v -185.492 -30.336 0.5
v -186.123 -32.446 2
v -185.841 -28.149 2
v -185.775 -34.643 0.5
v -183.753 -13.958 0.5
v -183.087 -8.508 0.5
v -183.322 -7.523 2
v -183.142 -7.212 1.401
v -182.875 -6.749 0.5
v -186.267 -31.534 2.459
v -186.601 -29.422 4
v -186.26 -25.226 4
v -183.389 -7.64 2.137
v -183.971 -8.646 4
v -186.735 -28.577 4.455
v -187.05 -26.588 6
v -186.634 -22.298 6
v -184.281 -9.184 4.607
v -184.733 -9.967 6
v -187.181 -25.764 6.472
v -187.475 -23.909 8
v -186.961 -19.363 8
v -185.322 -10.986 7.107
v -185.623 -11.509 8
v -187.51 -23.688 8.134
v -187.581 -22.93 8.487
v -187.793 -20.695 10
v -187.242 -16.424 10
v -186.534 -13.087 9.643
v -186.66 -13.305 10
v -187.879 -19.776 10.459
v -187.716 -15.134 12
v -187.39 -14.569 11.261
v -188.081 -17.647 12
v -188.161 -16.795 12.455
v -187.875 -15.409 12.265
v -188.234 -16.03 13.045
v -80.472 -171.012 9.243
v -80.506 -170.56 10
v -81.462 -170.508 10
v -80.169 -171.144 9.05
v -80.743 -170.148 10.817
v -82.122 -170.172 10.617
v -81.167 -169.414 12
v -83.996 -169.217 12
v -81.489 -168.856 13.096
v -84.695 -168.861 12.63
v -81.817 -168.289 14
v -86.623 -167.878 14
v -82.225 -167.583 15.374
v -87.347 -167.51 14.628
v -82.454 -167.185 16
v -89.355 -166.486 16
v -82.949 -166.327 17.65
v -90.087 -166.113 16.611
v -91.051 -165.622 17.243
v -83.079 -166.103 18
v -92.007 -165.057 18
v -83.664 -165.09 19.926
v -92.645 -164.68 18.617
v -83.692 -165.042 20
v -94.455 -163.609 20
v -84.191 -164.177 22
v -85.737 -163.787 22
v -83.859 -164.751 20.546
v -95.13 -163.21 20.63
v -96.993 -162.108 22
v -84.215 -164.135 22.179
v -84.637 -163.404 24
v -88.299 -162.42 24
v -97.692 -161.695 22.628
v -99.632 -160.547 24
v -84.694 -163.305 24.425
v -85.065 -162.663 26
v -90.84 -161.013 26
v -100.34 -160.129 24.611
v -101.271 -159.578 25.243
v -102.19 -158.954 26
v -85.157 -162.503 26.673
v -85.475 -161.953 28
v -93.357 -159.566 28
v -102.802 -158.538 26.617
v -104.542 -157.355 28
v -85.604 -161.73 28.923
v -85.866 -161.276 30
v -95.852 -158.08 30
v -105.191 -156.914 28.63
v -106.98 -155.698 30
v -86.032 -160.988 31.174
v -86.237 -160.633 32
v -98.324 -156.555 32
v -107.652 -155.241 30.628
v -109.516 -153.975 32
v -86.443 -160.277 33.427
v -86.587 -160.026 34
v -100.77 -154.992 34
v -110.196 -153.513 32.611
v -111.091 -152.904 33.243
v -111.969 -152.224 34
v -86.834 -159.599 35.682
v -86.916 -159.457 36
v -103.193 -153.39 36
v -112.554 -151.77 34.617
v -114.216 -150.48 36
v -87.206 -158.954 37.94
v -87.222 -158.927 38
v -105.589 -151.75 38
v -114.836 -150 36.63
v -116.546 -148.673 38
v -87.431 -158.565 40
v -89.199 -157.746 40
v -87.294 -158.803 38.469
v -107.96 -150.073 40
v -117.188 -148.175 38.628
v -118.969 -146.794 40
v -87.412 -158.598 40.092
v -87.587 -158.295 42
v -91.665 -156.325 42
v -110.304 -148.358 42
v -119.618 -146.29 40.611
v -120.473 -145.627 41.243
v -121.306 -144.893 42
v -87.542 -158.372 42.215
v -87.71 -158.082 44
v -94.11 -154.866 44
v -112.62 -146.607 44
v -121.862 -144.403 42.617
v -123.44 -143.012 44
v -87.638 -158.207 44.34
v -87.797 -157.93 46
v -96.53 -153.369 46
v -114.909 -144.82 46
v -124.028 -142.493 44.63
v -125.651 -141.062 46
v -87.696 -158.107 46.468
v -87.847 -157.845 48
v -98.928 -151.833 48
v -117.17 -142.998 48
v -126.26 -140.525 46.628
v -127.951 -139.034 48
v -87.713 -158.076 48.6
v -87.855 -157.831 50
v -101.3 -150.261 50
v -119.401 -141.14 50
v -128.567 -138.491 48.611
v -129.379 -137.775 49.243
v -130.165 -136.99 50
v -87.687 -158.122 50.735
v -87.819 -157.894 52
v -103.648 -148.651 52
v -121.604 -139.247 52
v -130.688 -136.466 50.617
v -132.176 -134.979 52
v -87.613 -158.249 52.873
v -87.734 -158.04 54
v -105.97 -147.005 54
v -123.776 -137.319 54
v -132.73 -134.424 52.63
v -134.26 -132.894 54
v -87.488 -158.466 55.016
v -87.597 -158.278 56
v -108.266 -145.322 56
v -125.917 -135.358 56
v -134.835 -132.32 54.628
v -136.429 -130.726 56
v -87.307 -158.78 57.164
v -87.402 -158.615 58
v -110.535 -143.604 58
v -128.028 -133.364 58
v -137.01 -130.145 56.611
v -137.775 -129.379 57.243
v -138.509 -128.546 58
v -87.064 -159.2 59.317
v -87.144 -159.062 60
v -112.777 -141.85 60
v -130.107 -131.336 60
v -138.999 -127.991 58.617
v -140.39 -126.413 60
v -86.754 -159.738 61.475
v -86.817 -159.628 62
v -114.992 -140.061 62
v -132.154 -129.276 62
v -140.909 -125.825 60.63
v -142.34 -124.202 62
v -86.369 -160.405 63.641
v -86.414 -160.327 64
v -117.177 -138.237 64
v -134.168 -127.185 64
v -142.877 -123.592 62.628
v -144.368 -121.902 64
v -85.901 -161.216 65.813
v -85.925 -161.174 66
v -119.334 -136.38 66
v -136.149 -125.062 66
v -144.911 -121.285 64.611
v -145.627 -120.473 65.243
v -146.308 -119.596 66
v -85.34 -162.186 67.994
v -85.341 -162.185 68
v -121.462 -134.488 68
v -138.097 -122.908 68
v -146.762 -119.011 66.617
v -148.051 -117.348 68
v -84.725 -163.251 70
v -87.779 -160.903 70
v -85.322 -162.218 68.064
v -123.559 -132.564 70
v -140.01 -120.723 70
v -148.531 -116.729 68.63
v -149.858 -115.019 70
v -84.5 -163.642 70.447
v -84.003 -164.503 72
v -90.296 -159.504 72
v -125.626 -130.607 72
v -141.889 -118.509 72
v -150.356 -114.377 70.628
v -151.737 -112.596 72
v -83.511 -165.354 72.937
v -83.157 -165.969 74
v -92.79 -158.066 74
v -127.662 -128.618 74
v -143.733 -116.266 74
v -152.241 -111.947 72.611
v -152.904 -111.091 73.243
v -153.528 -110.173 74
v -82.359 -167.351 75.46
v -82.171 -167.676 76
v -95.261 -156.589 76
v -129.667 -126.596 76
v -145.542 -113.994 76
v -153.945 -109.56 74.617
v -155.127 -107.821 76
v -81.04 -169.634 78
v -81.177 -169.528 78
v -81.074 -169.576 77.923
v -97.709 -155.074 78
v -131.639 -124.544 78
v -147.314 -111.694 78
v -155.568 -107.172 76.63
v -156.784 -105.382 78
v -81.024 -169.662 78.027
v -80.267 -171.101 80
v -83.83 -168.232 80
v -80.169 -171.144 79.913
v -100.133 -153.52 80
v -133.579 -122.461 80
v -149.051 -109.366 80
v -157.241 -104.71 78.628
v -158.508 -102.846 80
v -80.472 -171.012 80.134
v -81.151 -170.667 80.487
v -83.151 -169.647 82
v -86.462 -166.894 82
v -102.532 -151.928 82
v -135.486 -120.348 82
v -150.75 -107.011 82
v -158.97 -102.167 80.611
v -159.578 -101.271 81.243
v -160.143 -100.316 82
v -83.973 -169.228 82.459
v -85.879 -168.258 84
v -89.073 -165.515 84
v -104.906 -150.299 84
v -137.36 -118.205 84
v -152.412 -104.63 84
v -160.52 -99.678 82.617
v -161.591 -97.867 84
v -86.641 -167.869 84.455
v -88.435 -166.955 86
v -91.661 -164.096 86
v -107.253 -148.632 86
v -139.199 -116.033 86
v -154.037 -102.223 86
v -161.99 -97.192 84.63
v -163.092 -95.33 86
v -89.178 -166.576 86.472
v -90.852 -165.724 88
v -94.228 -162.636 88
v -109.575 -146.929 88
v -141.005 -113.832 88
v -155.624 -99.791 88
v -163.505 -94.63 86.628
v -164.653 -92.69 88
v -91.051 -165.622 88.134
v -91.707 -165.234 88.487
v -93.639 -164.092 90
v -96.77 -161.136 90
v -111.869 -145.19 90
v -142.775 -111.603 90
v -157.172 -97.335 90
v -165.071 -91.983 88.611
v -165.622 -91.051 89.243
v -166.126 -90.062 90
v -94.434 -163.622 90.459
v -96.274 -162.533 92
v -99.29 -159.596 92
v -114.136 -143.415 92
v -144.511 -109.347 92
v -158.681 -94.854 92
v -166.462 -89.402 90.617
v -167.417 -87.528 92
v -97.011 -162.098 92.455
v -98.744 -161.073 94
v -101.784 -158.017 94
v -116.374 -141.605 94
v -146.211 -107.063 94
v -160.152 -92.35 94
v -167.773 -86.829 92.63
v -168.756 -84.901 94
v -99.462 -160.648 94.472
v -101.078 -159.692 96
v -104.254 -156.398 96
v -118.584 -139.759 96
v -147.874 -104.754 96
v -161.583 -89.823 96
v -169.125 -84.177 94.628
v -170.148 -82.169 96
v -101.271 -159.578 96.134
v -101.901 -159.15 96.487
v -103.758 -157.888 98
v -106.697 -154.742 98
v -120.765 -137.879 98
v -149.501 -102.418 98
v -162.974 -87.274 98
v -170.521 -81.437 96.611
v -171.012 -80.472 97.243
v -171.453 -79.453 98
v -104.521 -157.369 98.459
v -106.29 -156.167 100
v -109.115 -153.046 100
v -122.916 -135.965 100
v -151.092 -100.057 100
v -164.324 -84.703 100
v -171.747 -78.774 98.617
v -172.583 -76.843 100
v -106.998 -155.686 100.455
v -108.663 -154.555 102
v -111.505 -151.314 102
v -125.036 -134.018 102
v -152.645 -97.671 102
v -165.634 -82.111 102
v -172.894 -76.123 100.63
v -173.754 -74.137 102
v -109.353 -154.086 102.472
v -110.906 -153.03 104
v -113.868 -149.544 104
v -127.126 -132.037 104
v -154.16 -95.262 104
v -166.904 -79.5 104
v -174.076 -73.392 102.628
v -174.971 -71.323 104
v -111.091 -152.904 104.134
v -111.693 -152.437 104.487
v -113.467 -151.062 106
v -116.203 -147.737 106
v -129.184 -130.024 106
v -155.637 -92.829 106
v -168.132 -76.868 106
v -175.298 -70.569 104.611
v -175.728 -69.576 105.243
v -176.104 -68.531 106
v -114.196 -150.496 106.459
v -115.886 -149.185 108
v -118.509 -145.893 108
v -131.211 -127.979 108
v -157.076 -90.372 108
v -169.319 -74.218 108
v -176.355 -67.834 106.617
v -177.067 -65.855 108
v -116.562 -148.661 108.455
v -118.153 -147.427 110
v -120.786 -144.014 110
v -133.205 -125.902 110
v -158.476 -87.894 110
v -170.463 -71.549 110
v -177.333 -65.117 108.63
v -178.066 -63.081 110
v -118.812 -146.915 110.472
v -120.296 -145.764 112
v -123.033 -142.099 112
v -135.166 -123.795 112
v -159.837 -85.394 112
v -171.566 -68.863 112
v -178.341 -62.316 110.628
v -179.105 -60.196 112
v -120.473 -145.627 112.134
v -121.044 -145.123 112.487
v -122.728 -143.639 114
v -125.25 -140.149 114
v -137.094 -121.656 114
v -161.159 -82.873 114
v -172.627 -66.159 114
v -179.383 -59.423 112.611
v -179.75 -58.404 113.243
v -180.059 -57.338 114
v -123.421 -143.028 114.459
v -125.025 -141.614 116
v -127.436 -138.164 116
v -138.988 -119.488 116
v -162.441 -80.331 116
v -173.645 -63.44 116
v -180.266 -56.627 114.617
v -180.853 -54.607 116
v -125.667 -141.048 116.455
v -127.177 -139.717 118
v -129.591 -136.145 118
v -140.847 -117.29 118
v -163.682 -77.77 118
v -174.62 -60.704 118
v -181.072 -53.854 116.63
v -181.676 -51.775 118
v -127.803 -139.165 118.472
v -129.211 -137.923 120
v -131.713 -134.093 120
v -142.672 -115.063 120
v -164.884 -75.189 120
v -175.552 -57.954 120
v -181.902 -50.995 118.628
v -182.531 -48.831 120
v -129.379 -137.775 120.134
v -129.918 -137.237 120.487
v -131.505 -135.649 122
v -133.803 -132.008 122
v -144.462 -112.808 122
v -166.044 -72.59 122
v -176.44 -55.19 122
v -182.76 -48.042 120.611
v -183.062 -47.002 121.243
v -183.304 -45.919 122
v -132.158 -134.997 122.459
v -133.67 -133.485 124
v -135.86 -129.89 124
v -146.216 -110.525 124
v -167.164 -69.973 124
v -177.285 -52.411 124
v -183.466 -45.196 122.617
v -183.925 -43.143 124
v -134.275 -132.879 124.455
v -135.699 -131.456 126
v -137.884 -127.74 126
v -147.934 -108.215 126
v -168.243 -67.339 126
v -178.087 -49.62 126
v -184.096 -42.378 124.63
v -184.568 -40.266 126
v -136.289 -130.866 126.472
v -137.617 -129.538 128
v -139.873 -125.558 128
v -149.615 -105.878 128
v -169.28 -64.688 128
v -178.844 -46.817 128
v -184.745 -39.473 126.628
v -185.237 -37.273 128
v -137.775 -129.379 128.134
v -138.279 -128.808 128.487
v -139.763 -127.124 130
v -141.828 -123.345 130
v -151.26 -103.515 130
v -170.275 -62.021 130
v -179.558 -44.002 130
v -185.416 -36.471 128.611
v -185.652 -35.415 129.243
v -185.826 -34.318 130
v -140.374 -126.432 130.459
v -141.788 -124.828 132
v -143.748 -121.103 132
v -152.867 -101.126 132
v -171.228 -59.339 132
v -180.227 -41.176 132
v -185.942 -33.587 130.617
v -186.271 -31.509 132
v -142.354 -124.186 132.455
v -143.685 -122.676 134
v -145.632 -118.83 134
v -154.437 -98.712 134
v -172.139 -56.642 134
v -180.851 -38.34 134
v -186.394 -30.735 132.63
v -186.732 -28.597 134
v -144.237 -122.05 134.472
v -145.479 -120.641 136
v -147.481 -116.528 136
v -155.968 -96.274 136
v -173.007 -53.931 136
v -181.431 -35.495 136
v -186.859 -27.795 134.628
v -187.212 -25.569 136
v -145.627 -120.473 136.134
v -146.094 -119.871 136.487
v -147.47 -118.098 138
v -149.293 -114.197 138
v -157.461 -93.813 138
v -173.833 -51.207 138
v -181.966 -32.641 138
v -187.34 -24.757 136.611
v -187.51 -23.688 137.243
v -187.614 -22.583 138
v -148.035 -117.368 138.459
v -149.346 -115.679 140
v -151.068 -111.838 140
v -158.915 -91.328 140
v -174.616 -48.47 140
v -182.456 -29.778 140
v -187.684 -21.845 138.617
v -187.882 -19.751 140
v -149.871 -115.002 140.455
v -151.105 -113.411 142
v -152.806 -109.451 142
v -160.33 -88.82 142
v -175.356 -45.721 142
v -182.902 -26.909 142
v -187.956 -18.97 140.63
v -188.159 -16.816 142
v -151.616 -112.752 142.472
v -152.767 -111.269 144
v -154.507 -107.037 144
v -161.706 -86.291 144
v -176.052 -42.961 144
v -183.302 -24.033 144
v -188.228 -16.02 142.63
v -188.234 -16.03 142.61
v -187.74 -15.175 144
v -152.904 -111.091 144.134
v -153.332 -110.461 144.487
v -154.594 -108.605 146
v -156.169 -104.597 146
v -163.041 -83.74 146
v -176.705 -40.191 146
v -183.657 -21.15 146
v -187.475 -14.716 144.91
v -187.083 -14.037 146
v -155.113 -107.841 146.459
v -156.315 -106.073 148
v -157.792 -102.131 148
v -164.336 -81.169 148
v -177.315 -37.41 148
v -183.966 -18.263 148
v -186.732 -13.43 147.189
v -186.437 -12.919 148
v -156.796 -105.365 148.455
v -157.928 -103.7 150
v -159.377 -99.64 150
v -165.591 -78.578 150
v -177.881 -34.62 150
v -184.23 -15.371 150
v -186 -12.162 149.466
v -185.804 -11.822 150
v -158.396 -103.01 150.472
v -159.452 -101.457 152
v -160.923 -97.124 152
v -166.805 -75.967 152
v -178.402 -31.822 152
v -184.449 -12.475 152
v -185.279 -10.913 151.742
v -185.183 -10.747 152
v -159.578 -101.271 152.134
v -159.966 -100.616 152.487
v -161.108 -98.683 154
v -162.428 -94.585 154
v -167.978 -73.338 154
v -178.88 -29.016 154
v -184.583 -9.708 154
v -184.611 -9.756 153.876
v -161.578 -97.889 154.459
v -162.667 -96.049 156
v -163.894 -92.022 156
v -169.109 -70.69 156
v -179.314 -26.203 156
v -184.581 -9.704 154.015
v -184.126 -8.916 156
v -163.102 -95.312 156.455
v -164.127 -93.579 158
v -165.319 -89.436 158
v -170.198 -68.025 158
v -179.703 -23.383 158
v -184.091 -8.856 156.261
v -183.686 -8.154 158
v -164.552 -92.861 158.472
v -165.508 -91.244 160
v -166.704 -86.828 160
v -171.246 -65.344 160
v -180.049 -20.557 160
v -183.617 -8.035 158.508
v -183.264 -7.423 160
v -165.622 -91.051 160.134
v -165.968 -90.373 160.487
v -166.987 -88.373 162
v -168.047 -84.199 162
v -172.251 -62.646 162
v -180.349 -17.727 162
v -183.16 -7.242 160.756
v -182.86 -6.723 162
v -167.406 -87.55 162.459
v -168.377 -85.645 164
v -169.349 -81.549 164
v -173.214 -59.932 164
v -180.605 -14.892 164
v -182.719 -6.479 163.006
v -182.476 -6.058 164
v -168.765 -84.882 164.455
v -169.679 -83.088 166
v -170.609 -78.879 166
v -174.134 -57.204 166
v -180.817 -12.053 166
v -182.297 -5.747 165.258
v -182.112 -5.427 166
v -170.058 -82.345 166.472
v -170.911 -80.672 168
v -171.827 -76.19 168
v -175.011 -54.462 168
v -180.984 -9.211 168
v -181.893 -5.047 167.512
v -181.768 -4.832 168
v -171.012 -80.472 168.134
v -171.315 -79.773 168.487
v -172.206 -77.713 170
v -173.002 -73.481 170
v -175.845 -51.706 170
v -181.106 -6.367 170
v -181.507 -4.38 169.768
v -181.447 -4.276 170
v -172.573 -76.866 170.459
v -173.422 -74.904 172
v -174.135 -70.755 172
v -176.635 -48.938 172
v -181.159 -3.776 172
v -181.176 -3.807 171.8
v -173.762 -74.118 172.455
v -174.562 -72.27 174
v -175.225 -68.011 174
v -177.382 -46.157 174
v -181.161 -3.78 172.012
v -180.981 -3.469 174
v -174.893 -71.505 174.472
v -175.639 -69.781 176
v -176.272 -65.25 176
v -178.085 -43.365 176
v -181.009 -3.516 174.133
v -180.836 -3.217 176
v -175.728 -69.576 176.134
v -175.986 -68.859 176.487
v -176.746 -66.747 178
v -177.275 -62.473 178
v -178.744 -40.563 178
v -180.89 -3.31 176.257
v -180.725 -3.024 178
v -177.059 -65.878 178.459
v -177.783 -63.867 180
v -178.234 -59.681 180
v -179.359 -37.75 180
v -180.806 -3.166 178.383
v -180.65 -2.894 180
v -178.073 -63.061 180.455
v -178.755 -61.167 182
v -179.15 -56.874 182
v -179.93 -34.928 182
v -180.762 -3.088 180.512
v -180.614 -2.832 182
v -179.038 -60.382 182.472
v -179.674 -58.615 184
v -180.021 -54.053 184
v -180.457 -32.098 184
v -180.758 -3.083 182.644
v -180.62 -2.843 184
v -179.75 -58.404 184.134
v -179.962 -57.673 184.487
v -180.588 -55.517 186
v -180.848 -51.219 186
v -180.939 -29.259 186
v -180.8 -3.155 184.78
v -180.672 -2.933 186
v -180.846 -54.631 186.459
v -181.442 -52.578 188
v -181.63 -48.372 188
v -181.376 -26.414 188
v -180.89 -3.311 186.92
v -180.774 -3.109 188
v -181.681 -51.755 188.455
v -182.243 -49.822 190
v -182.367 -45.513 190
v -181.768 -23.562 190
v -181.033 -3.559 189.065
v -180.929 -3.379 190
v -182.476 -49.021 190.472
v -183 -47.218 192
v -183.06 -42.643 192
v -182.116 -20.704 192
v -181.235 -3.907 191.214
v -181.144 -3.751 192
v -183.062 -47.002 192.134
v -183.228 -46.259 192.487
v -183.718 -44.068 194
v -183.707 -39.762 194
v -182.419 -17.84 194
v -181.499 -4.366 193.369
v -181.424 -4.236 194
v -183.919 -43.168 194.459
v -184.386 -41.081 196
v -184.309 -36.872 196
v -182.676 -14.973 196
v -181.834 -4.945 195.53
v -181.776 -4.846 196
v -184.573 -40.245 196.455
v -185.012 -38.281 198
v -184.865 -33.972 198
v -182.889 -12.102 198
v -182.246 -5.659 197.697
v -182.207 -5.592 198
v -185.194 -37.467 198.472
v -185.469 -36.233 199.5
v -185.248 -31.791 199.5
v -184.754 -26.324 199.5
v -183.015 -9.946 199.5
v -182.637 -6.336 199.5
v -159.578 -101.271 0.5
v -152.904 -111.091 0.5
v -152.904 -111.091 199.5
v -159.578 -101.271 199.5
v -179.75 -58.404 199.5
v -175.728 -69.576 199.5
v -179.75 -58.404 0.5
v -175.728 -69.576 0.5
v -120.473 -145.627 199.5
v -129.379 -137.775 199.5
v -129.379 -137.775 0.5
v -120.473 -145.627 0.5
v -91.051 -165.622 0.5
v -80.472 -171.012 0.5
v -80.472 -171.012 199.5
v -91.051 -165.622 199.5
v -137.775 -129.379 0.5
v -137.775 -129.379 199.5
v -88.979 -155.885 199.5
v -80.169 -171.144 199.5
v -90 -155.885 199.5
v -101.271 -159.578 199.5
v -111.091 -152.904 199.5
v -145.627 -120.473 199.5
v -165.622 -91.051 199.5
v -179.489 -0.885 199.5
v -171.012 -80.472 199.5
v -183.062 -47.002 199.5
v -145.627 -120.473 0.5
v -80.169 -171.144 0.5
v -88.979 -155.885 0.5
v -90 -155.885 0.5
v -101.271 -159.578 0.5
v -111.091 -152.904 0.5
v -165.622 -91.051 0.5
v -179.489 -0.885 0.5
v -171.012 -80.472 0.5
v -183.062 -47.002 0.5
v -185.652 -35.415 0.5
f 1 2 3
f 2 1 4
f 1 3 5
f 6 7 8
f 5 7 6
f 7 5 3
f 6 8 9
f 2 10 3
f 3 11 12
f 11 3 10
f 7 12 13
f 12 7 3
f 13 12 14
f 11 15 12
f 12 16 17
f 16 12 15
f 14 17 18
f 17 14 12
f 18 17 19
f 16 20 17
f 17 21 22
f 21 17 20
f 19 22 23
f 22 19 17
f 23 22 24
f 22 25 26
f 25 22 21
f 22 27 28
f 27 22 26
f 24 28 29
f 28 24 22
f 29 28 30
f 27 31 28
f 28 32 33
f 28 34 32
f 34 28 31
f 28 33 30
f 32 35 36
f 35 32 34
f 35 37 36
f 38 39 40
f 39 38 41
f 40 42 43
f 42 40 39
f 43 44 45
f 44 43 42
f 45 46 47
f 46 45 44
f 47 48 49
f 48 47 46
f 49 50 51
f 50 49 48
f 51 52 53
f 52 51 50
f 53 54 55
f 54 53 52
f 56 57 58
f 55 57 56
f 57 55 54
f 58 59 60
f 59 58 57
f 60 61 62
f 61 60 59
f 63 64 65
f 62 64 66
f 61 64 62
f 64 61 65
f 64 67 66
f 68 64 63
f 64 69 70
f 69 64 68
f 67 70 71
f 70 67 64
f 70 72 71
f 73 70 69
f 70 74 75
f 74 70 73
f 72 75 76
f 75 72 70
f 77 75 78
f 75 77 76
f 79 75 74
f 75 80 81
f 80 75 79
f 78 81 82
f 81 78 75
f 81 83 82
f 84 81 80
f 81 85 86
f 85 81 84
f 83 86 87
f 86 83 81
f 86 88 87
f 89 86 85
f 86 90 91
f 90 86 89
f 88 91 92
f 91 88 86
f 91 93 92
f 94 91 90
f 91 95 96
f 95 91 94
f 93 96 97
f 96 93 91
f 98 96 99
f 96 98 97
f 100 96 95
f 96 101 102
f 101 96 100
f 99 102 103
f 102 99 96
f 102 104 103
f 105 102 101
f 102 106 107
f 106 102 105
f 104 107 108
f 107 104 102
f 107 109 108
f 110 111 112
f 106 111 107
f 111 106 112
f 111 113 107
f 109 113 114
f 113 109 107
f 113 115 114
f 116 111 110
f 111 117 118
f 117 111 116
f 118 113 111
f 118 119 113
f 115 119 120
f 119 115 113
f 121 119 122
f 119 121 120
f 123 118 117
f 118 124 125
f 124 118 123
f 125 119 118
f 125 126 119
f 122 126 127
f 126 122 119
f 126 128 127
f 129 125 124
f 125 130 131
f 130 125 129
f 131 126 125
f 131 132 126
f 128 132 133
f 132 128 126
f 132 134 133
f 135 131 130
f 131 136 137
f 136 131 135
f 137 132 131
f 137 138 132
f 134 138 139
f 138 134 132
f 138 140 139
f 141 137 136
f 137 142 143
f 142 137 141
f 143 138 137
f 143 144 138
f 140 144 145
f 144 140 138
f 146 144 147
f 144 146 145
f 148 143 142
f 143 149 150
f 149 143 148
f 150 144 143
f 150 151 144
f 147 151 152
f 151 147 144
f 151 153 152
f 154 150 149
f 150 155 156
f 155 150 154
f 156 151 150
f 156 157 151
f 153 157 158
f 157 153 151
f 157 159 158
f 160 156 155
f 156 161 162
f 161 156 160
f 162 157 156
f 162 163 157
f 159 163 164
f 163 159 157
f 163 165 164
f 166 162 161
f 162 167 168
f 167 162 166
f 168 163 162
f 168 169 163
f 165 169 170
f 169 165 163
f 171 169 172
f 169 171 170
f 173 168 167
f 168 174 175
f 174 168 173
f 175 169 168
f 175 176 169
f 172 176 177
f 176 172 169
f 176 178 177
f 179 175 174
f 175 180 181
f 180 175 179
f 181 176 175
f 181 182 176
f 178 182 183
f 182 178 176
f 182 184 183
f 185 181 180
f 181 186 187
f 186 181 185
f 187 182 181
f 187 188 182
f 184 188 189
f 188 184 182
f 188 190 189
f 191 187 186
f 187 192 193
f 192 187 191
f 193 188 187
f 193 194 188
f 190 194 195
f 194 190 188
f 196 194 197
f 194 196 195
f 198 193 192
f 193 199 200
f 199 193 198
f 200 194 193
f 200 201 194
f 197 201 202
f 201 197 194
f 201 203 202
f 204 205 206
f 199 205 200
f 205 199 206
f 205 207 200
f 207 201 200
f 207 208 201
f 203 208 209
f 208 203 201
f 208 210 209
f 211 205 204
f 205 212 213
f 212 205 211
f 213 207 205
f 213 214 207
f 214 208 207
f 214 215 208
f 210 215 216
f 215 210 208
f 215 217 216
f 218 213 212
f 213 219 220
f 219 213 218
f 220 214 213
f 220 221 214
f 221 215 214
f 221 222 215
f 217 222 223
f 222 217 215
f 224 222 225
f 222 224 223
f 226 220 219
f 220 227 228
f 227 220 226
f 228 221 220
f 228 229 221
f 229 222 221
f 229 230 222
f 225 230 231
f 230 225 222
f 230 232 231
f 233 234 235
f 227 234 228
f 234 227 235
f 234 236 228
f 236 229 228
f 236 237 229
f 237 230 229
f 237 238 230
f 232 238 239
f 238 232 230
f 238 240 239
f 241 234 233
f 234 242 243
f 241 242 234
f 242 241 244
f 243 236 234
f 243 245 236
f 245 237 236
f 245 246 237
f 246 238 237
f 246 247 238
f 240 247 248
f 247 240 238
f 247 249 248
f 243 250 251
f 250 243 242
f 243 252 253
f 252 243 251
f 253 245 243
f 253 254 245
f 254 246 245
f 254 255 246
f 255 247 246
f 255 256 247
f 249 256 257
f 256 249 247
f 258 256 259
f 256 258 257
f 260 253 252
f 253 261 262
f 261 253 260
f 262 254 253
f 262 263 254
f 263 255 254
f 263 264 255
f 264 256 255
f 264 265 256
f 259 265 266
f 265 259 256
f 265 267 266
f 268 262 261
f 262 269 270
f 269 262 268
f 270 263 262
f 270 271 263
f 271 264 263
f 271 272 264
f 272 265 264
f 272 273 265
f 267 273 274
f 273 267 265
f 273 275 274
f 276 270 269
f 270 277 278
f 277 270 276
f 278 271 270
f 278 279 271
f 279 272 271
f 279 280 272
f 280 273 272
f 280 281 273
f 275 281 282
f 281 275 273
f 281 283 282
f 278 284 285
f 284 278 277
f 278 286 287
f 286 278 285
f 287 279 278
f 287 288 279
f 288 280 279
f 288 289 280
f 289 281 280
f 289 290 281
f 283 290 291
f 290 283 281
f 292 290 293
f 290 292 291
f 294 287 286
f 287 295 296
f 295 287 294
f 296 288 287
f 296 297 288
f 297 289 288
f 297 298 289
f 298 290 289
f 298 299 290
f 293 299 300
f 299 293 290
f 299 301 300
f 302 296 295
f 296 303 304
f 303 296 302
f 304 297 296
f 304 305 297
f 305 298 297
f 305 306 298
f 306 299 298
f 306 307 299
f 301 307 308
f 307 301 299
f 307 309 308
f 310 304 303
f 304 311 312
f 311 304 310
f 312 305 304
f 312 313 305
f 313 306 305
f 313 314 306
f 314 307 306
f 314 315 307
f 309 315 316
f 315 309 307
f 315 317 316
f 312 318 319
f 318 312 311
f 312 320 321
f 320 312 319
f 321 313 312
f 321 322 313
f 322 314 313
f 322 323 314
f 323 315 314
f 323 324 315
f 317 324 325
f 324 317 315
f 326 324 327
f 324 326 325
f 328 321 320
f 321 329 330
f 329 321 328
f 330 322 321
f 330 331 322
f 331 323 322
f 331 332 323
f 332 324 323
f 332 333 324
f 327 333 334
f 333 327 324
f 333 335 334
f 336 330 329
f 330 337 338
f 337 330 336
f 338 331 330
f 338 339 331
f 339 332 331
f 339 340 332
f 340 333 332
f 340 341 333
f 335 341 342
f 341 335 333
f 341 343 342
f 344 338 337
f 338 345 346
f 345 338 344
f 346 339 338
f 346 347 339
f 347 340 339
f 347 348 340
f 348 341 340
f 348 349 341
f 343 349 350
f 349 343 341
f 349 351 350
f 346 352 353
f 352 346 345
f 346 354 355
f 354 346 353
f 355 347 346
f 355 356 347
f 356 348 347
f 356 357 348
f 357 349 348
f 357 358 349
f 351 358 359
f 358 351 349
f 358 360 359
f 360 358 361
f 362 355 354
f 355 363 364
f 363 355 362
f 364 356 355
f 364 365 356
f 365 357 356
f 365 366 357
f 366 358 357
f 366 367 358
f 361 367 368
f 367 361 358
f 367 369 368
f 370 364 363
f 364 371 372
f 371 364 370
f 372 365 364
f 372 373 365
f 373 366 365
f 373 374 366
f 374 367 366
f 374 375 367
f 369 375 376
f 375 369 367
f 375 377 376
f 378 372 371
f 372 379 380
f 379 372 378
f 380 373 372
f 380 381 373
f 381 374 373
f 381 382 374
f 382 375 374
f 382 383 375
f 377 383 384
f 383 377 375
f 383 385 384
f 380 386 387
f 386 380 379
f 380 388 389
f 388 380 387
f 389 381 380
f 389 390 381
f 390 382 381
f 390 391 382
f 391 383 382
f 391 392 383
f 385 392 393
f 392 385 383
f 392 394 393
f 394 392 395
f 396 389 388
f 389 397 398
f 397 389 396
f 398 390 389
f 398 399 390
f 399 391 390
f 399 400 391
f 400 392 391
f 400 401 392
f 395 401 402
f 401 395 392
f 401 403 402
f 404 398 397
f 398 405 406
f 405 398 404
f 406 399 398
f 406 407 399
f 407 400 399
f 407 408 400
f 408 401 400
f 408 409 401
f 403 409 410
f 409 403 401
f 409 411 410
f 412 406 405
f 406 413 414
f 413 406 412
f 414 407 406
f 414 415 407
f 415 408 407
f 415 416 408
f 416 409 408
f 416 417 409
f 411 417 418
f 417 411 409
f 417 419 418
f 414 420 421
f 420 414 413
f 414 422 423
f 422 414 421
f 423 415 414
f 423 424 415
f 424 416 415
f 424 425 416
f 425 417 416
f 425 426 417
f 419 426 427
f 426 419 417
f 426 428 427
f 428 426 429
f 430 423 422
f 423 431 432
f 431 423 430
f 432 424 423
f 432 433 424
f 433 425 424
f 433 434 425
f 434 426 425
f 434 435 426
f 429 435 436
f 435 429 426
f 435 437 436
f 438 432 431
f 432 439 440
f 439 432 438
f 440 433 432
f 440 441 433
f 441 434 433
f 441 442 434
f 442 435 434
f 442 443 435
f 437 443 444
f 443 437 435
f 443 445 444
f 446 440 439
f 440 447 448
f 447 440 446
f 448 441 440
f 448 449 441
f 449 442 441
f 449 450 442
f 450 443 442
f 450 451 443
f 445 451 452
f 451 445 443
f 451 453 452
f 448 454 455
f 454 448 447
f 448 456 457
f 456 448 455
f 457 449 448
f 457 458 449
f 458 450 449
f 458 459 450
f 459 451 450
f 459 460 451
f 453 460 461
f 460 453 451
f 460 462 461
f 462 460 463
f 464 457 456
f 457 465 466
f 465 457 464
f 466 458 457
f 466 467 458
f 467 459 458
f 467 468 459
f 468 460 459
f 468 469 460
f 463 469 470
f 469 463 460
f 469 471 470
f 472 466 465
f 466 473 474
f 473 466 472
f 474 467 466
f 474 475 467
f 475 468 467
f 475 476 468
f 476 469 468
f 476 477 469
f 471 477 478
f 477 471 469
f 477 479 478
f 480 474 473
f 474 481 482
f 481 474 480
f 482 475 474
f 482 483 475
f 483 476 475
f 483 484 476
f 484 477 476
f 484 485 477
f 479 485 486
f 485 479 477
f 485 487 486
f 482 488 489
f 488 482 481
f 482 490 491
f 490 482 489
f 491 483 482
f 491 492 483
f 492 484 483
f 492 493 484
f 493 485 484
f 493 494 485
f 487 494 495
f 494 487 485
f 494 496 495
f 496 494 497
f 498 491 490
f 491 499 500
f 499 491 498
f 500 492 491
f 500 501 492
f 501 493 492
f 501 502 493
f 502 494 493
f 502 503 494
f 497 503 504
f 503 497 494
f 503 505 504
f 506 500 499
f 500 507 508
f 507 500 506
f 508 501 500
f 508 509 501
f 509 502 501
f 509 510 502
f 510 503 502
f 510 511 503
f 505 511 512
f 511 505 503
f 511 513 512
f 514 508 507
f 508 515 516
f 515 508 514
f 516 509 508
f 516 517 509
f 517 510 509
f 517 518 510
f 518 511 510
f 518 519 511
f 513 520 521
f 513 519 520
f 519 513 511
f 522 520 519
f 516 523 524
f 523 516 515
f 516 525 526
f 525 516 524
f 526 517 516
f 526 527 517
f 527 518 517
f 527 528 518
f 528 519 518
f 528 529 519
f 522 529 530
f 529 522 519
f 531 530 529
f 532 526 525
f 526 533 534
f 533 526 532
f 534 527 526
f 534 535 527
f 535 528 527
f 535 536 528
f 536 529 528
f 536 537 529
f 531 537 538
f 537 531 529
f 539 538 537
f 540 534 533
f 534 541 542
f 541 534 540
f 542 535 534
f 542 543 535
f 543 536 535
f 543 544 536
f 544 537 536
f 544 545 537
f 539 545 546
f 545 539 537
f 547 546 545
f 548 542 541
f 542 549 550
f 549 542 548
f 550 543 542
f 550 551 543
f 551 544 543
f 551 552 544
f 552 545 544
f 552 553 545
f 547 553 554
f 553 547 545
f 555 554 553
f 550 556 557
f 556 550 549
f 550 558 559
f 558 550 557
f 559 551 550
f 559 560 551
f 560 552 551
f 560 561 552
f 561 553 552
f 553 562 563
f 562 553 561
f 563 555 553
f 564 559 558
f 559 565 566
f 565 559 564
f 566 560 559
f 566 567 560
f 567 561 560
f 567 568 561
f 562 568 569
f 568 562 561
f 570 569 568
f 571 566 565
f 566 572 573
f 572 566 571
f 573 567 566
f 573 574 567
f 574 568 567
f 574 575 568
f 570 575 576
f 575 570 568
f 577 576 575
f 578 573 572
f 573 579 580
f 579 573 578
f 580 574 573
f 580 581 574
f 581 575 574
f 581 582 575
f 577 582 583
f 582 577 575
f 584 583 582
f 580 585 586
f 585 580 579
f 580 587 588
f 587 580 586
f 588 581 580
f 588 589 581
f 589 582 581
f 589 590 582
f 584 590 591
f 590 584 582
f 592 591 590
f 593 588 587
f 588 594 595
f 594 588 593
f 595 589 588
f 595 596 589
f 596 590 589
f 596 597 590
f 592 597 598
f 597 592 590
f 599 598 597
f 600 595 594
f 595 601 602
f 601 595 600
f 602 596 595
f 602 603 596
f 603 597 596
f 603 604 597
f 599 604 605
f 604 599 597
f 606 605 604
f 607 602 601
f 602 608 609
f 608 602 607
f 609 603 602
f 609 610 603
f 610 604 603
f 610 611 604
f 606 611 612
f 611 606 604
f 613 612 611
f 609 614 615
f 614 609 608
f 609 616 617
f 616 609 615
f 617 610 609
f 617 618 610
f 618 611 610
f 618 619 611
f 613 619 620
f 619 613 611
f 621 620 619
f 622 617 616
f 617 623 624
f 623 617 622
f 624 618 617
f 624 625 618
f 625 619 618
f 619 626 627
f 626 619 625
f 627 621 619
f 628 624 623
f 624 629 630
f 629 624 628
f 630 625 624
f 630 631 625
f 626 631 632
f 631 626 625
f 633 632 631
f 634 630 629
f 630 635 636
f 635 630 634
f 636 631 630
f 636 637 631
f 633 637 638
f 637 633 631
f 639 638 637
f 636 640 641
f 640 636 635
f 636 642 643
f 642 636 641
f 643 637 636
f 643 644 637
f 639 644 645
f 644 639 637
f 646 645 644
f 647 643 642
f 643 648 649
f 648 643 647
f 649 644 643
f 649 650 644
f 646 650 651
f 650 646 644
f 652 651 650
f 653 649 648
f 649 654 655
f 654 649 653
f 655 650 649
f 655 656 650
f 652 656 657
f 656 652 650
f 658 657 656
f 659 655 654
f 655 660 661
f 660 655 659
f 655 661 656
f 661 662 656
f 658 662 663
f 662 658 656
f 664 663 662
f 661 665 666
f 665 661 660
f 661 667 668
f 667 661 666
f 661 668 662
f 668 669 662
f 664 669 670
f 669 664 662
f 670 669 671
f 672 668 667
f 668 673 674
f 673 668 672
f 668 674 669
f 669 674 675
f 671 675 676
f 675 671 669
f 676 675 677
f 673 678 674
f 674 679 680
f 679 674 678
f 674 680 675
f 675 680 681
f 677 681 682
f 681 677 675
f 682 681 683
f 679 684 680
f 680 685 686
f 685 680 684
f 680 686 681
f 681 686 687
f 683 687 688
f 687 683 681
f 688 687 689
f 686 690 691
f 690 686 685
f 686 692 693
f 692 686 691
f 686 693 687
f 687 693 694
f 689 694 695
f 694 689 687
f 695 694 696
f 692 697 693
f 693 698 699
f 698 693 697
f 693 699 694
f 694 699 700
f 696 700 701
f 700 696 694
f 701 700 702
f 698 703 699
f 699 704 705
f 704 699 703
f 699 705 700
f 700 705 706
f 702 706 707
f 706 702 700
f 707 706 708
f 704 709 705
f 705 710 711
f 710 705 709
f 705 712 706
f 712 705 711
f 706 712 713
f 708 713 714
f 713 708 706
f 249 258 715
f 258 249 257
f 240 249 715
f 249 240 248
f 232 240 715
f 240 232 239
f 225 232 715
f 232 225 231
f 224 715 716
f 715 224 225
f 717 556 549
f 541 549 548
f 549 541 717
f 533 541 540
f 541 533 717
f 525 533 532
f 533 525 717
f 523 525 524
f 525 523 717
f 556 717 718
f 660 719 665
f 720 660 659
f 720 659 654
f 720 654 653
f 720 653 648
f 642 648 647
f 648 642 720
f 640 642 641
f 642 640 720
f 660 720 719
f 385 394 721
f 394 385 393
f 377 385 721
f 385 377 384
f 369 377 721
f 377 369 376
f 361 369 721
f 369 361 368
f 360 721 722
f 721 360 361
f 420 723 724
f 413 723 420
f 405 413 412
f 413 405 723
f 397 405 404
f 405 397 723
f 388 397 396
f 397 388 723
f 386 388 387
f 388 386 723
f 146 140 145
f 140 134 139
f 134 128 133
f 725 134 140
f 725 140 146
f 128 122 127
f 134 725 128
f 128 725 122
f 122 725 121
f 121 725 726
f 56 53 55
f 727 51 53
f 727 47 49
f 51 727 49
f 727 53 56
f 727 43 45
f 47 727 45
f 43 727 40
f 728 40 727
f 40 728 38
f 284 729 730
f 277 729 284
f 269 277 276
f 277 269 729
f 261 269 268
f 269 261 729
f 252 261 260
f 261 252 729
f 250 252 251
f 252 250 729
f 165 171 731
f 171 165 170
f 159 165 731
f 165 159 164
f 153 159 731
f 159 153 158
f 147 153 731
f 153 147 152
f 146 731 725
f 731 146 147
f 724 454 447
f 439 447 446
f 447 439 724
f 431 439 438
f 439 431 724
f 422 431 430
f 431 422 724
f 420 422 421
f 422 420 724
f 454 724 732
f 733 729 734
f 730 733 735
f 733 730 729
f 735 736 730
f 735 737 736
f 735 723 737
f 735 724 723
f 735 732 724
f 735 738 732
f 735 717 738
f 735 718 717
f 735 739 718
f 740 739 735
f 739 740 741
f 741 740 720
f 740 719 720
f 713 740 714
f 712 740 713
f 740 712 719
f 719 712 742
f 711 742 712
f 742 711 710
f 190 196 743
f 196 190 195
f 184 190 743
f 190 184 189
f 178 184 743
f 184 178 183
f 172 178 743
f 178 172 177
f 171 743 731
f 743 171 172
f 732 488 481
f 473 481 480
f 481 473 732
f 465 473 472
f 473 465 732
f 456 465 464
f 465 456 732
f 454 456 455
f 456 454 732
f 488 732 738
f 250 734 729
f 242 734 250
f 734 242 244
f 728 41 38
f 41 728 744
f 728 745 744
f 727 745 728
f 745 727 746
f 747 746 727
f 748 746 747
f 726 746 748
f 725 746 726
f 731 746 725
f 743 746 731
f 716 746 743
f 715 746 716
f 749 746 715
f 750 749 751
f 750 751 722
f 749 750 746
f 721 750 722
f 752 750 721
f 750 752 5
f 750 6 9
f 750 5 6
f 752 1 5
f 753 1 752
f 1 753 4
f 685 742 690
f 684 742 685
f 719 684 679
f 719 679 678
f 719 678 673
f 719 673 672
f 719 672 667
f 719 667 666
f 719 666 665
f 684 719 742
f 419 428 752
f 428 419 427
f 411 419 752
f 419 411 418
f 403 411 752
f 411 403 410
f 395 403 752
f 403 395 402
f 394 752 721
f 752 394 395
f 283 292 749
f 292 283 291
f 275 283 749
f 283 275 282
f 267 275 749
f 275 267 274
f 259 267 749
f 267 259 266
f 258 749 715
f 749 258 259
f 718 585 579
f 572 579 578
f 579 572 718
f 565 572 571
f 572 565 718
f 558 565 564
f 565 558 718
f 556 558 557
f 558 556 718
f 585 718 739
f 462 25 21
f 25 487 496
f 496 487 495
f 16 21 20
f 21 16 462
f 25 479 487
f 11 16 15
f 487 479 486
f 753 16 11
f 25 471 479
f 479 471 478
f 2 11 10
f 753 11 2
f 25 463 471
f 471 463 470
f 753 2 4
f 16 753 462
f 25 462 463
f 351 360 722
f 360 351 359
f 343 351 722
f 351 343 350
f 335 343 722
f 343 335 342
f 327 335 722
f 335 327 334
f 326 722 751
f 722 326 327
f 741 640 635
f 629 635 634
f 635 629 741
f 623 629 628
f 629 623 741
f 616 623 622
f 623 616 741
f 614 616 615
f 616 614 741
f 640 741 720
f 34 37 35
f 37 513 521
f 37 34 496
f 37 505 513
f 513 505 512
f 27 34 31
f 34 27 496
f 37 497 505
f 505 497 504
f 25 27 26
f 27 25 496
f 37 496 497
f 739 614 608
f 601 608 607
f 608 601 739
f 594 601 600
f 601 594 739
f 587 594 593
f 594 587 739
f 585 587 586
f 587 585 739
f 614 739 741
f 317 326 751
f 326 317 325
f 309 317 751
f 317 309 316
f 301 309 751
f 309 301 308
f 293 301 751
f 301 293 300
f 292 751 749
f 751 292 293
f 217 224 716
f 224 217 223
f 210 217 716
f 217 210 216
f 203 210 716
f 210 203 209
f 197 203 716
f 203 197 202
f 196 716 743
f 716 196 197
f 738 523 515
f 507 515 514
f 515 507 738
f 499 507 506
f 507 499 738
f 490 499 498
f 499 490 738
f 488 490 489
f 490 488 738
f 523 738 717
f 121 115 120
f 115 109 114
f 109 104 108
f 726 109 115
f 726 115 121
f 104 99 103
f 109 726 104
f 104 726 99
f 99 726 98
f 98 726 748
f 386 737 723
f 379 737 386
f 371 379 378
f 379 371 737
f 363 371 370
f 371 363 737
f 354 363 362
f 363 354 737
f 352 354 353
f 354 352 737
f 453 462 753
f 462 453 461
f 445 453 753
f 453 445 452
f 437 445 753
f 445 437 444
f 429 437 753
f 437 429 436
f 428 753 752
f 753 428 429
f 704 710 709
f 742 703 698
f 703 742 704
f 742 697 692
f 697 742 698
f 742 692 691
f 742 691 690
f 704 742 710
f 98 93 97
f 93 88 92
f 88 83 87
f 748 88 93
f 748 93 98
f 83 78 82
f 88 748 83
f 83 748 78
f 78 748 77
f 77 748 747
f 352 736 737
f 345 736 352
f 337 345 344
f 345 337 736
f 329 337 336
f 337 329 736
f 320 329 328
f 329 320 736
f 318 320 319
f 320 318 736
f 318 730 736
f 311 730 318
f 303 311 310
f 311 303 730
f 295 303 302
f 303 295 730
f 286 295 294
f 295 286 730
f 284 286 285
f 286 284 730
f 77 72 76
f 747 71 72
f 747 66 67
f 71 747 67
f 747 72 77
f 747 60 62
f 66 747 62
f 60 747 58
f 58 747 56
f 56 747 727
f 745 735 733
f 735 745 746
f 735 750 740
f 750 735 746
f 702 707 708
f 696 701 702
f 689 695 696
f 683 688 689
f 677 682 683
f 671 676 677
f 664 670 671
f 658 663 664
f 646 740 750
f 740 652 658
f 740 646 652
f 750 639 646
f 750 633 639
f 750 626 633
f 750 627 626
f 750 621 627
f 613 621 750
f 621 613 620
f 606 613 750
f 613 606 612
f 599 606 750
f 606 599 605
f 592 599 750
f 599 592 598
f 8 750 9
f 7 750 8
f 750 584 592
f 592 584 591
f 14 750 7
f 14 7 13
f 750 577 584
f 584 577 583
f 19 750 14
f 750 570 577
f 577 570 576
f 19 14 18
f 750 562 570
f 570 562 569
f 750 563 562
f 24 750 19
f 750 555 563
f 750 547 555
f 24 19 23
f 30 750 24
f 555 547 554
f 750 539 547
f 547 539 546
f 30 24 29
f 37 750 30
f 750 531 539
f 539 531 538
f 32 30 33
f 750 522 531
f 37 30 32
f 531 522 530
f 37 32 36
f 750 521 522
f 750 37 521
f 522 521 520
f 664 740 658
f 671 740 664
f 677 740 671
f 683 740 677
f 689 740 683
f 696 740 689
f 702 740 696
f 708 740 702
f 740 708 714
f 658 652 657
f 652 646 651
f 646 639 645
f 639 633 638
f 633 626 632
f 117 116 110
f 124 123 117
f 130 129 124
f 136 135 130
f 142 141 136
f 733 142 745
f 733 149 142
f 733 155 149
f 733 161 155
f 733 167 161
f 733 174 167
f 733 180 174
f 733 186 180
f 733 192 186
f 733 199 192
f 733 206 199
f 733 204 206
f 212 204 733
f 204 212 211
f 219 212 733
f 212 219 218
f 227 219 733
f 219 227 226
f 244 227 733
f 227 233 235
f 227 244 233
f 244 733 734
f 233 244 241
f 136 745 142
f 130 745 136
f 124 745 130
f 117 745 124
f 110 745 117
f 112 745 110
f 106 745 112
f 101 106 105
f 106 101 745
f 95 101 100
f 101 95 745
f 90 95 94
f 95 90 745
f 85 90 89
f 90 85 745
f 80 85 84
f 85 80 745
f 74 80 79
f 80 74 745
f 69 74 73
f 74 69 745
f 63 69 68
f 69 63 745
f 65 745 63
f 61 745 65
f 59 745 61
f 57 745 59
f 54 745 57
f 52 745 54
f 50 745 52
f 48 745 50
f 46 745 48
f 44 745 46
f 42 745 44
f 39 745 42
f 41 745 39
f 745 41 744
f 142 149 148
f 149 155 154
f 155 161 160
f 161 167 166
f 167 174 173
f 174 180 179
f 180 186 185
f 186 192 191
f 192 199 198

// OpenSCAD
intersection() {
difference() {
translate([0,0,100]) {cylinder (r = 189, h = 199, $fn = 100, center = true);}

union() {
linear_extrude(height = 200, twist = 90, $fn = 400) translate([-50,-100,0]){import(file = "wing.dxf", center = false, $fn = 100);} rotate([0,30,0]);

rotate([0,0,90]) {linear_extrude(height = 200, twist = 90, $fn = 400) translate([-50,-100,0]){import(file = "wing.dxf", center = false, $fn = 100);} rotate([0,30,0]);}

rotate([0,0,180]) {linear_extrude(height = 200, twist = 90, $fn = 400) translate([-50,-100,0]){import(file = "wing.dxf", center = false, $fn = 100);} rotate([0,30,0]);}

rotate([0,0,270]) {linear_extrude(height = 200, twist = 90, $fn = 400) translate([-50,-100,0]){import(file = "wing.dxf", center = false, $fn = 100);} rotate([0,30,0]);}
}

cylinder(h = 400, r = 180, center = true, $fn = 6);

translate ([0,175,100]){cube ([400,40,200], center = true);}

rotate([0,0,60]) {translate ([0,175,100]){cube ([400,40,200], center = true);}}
}


rotate([0,0,120]) {translate ([0,175,100]){cube ([400,40,200], center = true);}}
}
